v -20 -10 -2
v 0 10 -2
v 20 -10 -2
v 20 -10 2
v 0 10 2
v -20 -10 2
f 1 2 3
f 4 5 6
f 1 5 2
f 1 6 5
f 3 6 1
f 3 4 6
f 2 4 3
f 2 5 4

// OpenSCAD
// file: vars.scad
$fn = 12;
COLOR = "LimeGreen"; // Model color
TRIANGLE_SIDE = 40; // Triangle side size
TRIANGLE_THICKNESS = 4; // Triagle thickness
JOINT_WIDTH = TRIANGLE_SIDE/4; // Max width for clip/hinge
JOINT_TOLLERANCE = 0.5; // Fixed joint tollerance
// main file
include <vars.scad>;

module triangle(){
  translate([0, 0, -TRIANGLE_THICKNESS/2]) {
    linear_extrude(TRIANGLE_THICKNESS) {
      polygon([[-TRIANGLE_SIDE/2, -TRIANGLE_SIDE/4], [0, TRIANGLE_SIDE/4], [TRIANGLE_SIDE/2, -TRIANGLE_SIDE/4]]);
    };
  }
}

color(COLOR, 1) {
  triangle();
}
